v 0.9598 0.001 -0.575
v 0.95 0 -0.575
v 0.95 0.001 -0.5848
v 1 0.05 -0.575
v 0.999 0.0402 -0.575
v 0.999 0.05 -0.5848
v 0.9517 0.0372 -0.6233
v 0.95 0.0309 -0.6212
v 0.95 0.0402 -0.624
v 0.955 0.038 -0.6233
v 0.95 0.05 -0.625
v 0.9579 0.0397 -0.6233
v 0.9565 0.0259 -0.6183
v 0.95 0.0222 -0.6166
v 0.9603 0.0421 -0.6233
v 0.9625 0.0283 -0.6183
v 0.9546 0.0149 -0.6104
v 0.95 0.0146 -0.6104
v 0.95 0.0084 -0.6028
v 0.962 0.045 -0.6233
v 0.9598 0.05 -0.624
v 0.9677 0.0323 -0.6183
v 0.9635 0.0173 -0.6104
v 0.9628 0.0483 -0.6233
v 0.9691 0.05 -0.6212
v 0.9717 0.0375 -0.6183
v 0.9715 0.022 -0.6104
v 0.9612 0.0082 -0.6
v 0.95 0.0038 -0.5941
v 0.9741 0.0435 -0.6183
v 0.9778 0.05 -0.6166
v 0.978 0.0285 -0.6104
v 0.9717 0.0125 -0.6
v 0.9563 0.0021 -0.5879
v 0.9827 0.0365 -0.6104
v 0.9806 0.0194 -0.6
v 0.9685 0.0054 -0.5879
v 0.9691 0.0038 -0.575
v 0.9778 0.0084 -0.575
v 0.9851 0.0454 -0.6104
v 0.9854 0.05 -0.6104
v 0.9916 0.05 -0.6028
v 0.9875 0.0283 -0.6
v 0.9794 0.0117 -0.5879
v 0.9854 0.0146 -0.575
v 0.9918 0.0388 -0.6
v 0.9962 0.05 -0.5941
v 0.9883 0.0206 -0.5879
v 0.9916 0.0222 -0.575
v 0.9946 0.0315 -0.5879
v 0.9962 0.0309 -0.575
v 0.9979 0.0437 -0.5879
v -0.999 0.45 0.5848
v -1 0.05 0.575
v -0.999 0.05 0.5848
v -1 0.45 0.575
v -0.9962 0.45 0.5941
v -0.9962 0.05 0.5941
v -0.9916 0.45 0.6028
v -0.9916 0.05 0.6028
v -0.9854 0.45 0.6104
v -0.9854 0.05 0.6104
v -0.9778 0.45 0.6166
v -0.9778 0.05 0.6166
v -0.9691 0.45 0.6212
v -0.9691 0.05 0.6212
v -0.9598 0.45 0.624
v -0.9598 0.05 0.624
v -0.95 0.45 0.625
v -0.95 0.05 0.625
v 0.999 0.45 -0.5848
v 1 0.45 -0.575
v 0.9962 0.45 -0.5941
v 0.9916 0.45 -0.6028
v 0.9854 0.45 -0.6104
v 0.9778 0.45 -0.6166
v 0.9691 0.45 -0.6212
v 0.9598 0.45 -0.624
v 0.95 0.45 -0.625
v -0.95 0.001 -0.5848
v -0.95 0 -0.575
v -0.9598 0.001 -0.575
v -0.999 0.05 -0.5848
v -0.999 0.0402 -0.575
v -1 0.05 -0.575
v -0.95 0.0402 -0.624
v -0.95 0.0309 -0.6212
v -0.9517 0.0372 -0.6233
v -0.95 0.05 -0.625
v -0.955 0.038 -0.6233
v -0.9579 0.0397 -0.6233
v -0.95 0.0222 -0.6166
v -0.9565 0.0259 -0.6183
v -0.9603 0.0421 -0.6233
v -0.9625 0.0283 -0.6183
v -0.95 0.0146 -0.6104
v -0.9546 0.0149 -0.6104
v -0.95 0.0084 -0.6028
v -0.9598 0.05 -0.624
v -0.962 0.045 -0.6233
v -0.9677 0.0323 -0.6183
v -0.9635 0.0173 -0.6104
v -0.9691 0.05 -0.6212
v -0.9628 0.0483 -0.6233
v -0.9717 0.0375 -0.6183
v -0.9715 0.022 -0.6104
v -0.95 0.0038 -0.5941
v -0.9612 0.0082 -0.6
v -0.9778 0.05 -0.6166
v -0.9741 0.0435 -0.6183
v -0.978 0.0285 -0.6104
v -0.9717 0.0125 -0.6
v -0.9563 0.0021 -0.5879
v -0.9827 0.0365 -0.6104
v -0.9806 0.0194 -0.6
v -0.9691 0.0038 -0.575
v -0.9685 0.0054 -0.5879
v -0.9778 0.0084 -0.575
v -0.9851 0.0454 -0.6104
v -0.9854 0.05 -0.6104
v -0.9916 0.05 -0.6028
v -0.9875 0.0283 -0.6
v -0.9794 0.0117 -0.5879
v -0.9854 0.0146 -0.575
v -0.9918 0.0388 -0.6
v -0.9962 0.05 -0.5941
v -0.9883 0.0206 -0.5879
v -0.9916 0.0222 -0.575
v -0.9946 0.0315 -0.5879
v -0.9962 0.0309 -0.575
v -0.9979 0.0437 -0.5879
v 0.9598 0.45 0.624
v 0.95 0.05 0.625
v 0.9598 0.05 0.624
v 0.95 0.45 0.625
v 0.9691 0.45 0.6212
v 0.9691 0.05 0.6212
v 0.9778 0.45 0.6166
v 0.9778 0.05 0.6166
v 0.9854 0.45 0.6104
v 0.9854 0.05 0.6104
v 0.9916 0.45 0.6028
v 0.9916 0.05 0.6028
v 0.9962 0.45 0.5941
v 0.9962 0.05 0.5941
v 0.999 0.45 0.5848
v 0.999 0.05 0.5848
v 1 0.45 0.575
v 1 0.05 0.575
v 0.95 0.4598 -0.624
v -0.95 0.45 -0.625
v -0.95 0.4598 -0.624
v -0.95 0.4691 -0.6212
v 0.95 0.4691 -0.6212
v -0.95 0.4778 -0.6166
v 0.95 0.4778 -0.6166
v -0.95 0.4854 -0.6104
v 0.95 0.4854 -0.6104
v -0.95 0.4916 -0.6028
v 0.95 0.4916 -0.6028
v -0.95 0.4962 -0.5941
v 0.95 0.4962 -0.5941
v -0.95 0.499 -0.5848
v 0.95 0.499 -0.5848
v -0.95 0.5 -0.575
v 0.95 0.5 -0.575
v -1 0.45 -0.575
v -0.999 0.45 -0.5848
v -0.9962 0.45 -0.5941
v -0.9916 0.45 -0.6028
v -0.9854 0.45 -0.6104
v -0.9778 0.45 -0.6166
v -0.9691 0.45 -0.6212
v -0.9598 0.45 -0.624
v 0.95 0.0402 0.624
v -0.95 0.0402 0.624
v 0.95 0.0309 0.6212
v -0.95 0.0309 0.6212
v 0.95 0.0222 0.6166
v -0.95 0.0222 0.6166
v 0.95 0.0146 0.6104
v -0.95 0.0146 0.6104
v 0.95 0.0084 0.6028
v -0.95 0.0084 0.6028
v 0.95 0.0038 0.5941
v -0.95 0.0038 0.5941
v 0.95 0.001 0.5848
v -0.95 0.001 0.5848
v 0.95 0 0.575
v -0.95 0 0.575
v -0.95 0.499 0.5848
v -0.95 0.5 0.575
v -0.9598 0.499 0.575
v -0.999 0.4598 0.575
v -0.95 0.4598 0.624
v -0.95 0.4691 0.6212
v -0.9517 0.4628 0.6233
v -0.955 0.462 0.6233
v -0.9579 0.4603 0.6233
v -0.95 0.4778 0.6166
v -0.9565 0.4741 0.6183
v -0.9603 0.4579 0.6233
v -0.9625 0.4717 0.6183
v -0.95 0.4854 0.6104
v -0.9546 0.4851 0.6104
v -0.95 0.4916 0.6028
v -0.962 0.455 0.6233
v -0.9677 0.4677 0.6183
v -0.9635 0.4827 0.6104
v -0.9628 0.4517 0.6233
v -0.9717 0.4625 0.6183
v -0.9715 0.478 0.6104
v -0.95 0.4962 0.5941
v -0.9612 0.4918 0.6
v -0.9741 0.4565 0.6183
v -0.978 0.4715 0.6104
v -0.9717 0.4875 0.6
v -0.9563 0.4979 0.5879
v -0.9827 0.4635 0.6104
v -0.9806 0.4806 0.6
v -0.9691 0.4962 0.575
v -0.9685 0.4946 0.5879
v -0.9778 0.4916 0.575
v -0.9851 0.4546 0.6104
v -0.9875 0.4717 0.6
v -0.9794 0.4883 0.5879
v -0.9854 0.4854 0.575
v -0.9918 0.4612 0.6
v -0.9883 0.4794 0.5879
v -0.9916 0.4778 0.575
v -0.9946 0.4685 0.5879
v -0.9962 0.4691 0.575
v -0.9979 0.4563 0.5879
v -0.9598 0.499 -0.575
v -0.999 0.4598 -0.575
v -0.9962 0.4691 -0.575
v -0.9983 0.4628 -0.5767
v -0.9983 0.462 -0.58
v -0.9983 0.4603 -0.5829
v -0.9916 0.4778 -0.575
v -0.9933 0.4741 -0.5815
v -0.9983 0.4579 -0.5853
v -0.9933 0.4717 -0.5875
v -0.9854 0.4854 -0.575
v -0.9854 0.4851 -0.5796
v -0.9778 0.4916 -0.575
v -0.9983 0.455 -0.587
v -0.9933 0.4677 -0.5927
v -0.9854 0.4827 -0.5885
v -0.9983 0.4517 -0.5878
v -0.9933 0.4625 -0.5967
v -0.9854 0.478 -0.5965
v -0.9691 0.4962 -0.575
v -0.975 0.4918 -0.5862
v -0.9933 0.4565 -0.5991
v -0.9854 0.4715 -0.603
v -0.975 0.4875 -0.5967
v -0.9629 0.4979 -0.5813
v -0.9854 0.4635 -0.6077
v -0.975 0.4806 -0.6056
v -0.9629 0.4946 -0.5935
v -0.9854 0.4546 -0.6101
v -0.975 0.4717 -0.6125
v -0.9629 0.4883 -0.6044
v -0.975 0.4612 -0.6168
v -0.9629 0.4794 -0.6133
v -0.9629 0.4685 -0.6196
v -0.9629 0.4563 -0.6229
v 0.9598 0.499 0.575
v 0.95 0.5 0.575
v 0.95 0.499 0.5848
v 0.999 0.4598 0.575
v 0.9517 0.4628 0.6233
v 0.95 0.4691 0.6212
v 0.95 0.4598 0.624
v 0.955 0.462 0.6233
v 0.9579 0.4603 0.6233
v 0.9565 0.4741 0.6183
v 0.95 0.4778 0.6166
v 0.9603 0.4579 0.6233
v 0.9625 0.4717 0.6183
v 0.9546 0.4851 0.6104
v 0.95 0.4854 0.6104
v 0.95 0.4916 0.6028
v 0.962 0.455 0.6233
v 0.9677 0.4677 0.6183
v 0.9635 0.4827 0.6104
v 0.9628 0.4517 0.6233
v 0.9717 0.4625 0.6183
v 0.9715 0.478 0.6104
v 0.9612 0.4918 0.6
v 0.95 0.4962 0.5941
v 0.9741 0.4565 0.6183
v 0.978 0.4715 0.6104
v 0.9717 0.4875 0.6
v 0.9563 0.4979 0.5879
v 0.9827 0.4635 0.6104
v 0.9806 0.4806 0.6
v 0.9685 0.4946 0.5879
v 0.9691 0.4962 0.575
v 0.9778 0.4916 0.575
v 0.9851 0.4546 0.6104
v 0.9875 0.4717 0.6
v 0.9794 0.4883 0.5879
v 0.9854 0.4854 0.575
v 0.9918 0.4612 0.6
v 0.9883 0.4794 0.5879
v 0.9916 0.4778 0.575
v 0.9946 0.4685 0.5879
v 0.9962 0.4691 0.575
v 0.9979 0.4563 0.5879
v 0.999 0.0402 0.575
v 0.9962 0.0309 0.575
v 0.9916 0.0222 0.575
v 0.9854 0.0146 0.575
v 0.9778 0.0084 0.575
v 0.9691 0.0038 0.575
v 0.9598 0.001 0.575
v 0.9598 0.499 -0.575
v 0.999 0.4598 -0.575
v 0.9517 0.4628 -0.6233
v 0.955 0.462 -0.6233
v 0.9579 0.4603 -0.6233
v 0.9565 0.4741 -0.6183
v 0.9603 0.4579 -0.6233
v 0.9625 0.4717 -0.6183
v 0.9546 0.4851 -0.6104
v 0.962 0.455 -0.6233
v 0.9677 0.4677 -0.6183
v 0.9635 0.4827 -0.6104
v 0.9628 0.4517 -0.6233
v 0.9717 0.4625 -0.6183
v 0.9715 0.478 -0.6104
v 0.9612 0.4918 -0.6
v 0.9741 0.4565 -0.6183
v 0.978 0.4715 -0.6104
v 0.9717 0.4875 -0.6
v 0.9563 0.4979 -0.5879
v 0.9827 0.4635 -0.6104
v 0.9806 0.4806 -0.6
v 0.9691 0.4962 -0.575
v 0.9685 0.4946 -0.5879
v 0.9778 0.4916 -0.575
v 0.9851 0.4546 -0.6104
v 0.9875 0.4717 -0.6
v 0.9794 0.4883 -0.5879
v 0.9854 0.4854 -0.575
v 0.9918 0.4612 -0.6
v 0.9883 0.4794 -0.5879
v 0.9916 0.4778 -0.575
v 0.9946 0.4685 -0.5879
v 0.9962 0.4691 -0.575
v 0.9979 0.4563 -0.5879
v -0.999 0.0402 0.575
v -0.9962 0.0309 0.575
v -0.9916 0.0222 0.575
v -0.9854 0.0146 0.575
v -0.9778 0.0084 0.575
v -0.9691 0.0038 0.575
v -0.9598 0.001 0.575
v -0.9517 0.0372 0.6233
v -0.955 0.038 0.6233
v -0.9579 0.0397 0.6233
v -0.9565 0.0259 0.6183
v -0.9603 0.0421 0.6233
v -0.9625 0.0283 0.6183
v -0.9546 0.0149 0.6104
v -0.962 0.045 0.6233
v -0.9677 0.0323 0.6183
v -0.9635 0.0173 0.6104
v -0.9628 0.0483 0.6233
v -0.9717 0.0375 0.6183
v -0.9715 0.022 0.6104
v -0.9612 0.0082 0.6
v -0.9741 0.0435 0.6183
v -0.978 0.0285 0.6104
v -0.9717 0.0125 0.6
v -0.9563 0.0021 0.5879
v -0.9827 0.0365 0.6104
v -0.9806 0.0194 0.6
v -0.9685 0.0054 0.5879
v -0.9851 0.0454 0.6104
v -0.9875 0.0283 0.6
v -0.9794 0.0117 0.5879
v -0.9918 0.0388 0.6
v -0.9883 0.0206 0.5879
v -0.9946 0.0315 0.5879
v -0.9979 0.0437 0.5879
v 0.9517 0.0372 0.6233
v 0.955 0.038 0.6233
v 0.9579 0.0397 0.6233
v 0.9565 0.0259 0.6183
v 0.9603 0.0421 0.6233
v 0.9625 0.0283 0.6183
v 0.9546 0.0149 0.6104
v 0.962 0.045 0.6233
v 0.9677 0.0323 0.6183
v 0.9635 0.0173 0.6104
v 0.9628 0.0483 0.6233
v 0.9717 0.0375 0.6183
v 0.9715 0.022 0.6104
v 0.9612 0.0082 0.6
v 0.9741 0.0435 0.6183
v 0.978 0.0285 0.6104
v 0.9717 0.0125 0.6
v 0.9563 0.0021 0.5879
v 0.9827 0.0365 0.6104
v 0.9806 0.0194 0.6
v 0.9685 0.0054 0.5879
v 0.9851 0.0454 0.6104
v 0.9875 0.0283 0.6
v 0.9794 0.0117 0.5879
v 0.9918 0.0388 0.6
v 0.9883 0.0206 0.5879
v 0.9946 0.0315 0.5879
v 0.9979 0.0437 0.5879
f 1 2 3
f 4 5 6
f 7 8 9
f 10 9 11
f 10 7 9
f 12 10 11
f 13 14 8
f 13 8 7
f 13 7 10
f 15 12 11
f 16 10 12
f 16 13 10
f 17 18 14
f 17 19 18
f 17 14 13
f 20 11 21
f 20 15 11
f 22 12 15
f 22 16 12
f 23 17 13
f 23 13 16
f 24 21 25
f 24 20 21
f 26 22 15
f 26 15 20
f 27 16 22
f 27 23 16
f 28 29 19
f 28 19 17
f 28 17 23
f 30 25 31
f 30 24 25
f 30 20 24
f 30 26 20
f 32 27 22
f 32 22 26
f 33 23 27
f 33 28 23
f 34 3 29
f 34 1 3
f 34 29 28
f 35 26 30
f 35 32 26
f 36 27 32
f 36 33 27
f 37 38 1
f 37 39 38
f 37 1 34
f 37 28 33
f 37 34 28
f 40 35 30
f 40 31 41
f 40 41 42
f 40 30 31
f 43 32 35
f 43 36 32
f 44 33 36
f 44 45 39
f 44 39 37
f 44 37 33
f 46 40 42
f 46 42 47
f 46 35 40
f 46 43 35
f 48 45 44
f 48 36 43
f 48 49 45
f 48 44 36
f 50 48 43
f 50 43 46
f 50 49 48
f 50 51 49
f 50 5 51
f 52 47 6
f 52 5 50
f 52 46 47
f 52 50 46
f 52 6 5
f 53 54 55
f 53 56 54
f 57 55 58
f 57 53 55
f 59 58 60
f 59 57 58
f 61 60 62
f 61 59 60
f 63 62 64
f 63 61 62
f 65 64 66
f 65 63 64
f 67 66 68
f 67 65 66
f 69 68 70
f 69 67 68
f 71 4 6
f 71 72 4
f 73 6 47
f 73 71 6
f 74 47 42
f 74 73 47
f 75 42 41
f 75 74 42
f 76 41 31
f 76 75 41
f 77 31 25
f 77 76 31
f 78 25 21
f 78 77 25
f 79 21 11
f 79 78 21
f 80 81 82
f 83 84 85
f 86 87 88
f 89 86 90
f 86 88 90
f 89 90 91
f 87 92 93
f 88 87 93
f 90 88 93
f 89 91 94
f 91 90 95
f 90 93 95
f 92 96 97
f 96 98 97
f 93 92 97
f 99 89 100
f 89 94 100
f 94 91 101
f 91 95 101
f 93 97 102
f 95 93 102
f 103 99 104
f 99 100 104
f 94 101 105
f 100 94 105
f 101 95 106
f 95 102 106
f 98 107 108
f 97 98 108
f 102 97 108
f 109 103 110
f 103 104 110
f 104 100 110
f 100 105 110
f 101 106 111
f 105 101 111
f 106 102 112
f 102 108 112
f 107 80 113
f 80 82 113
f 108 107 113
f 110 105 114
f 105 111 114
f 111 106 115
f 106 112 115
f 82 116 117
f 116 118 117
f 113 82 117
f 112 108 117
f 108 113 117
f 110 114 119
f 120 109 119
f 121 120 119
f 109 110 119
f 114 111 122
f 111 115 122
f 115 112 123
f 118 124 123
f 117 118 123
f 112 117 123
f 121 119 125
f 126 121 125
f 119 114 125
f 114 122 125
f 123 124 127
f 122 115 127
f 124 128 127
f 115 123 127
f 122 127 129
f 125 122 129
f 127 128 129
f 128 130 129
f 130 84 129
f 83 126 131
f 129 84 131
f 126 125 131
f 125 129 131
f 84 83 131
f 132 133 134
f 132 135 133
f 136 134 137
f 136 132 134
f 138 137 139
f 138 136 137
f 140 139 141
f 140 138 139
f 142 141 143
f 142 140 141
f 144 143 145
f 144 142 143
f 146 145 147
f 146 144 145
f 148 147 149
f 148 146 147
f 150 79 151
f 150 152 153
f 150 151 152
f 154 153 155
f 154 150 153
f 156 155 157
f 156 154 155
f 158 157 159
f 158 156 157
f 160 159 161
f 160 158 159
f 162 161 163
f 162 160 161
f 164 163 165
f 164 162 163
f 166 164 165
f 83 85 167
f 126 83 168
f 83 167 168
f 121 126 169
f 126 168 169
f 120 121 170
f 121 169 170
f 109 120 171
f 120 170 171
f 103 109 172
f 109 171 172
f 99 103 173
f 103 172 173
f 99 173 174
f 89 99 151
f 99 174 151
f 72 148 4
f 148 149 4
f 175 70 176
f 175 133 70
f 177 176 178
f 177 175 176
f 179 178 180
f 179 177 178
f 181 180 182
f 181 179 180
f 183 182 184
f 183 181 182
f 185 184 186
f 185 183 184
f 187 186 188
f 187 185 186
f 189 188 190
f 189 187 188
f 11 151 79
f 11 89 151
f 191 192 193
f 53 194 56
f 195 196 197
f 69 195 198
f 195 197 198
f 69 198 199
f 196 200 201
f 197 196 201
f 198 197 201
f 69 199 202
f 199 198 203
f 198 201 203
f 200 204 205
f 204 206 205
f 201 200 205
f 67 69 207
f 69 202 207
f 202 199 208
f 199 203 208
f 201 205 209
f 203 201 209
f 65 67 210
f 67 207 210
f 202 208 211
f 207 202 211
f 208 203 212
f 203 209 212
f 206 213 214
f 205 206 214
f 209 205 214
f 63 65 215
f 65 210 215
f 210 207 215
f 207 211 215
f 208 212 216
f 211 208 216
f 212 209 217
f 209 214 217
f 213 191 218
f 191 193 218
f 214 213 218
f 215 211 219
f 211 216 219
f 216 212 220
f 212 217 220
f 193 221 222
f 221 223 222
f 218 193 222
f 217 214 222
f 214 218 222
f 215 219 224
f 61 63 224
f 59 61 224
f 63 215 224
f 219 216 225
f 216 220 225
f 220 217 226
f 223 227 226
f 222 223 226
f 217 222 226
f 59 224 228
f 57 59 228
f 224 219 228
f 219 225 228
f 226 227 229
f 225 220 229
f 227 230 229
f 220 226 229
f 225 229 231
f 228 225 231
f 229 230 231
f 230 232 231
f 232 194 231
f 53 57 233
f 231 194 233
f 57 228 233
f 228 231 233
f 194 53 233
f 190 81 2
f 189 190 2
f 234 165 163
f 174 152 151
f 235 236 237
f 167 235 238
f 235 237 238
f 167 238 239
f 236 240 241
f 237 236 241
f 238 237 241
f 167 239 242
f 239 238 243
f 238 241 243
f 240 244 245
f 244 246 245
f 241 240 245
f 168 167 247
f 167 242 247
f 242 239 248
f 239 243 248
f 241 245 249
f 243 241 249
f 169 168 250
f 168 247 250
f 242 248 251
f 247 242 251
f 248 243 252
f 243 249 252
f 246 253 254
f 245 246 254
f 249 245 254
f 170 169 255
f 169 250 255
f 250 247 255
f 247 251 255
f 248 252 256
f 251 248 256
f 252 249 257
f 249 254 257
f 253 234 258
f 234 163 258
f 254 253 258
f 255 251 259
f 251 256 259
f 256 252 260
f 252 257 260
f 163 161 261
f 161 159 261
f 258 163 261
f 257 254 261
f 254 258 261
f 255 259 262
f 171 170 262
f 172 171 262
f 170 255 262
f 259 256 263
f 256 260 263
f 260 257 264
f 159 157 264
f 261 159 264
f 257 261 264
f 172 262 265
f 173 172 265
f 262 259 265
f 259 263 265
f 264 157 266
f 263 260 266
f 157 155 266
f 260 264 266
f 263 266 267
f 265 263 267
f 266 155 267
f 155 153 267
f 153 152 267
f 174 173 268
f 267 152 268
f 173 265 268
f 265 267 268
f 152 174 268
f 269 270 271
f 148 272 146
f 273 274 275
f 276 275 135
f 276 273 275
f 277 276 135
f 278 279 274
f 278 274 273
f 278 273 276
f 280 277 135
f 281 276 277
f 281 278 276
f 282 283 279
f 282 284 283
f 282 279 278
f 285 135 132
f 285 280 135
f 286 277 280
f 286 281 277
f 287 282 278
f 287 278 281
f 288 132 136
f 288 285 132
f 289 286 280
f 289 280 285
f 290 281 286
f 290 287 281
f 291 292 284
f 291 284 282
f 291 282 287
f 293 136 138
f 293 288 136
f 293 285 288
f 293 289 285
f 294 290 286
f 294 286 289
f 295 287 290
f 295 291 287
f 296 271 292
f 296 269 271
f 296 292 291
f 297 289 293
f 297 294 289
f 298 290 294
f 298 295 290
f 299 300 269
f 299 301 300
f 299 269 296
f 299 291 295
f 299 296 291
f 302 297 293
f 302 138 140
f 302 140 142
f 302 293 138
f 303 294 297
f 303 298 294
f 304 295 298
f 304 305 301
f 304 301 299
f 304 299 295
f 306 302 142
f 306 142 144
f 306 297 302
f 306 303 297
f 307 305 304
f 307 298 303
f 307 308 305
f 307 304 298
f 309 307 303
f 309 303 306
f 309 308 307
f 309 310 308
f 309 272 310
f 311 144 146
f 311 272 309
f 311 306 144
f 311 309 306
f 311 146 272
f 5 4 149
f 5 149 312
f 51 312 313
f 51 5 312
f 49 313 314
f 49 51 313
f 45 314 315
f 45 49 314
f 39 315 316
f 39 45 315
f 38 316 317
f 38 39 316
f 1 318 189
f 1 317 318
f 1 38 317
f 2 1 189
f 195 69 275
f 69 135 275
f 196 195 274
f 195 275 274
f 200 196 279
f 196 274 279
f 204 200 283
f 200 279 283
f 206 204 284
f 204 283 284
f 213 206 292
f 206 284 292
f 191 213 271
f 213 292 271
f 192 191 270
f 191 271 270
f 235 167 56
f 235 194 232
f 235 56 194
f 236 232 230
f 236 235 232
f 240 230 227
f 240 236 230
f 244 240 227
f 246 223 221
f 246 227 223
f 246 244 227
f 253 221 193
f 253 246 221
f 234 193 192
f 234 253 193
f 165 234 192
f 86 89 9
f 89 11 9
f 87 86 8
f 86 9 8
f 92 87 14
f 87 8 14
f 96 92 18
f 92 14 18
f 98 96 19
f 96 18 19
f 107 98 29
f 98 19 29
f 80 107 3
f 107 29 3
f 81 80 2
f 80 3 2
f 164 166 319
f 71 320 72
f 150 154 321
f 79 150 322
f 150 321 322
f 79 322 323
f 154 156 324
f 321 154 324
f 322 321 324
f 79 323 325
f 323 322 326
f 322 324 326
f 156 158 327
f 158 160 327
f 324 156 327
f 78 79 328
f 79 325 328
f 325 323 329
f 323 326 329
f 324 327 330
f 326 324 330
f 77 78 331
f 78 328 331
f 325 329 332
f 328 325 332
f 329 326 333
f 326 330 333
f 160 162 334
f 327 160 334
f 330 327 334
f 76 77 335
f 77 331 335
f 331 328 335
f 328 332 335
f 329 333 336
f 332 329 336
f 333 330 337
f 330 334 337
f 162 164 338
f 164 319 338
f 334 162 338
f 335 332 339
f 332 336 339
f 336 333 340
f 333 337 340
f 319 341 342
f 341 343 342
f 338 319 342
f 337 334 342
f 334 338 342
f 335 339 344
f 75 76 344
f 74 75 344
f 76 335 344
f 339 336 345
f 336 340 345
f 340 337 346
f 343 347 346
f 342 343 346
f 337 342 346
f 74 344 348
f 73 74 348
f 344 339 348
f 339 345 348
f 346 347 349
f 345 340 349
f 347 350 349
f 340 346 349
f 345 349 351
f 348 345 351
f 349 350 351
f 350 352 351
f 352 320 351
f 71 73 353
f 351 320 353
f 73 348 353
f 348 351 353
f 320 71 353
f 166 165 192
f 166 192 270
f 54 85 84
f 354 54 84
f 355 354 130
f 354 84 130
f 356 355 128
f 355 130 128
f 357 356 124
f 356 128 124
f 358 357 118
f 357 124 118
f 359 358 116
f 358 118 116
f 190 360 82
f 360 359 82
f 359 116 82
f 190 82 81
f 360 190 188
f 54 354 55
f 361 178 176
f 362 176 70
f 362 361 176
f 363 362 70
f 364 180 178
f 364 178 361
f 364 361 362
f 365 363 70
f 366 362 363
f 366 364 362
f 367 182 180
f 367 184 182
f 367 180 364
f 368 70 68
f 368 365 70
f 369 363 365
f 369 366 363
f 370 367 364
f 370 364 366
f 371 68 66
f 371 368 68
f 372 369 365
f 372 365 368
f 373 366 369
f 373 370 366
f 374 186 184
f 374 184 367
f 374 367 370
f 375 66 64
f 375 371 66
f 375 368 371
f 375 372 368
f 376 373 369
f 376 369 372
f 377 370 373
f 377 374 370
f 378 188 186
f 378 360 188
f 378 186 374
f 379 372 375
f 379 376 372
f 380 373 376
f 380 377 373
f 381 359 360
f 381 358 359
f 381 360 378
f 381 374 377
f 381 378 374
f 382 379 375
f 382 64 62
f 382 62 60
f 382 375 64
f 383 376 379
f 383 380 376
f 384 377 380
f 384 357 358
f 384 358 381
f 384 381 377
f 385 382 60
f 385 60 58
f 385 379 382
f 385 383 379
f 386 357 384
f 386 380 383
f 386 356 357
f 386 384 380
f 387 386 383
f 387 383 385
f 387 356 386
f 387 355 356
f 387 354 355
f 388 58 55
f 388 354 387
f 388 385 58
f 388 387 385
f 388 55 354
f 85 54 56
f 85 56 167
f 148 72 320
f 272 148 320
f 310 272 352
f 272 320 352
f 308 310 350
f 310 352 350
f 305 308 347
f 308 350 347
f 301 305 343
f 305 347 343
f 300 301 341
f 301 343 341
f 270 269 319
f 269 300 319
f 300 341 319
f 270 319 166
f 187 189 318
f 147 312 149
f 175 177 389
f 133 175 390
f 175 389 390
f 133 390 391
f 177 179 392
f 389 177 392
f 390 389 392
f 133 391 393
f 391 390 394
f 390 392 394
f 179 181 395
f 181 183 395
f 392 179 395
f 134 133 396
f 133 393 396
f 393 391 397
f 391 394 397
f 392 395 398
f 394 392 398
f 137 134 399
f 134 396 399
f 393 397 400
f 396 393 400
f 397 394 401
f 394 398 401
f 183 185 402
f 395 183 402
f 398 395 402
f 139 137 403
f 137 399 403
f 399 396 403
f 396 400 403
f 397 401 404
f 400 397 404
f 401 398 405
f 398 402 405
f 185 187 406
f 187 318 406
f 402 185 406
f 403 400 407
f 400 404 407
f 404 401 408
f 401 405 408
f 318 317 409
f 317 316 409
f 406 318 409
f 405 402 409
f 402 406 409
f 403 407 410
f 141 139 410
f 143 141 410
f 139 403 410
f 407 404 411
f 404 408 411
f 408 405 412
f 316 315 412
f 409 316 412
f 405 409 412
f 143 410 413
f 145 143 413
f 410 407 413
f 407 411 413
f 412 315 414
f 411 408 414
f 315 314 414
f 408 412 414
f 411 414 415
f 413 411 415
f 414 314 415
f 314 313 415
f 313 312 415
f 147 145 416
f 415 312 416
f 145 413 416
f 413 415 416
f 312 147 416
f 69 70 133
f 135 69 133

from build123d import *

# Parameters (mm, degrees)
SKETCH1_W           = 2
SKETCH1_H           = 1.25
BOSS_EXTRUDE1_DEPTH = 0.5
FILLET1_R           = 0.05


with BuildPart() as part:
    # Sketch1 → Boss-Extrude1 (new body)
    with BuildSketch(Plane(origin=(0, 0, 0), x_dir=(1, 0, 0), z_dir=(0, 1, 0))):
        Rectangle(SKETCH1_W, SKETCH1_H)
    extrude(amount=BOSS_EXTRUDE1_DEPTH)

    # Fillet1
    fillet1_edges = [part.edges().sort_by_distance(p)[0] for p in [
        (1, 0.5, 0),
        (0, 0.5, -0.625),
        (1, 0, 0),
        (1, 0, 0),
        (1, 0.5, 0),
        (1, 0.5, 0),
        (1, 0, 0),
        (1, 0, 0),
        (1, 0.5, 0),
        (1, 0.5, 0),
        (-1, 0, 0),
        (-1, 0, 0),
        (-1, 0.5, 0),
        (-1, 0.5, 0),
        (-1, 0.5, 0),
        (-1, 0.5, 0),
        (-1, 0, 0),
        (-1, 0, 0),
        (-1, 0.5, 0),
        (0, 0, -0.625),
        (1, 0, 0),
        (0, 0, 0.625),
        (-1, 0, 0),
        (0, 0.5, 0.625),
        (-1, 0.25, -0.625),
        (1, 0.25, -0.625),
        (1, 0.25, 0.625),
        (-1, 0.25, 0.625),
    ]]
    fillet(fillet1_edges, radius=FILLET1_R)


solid = part.part
